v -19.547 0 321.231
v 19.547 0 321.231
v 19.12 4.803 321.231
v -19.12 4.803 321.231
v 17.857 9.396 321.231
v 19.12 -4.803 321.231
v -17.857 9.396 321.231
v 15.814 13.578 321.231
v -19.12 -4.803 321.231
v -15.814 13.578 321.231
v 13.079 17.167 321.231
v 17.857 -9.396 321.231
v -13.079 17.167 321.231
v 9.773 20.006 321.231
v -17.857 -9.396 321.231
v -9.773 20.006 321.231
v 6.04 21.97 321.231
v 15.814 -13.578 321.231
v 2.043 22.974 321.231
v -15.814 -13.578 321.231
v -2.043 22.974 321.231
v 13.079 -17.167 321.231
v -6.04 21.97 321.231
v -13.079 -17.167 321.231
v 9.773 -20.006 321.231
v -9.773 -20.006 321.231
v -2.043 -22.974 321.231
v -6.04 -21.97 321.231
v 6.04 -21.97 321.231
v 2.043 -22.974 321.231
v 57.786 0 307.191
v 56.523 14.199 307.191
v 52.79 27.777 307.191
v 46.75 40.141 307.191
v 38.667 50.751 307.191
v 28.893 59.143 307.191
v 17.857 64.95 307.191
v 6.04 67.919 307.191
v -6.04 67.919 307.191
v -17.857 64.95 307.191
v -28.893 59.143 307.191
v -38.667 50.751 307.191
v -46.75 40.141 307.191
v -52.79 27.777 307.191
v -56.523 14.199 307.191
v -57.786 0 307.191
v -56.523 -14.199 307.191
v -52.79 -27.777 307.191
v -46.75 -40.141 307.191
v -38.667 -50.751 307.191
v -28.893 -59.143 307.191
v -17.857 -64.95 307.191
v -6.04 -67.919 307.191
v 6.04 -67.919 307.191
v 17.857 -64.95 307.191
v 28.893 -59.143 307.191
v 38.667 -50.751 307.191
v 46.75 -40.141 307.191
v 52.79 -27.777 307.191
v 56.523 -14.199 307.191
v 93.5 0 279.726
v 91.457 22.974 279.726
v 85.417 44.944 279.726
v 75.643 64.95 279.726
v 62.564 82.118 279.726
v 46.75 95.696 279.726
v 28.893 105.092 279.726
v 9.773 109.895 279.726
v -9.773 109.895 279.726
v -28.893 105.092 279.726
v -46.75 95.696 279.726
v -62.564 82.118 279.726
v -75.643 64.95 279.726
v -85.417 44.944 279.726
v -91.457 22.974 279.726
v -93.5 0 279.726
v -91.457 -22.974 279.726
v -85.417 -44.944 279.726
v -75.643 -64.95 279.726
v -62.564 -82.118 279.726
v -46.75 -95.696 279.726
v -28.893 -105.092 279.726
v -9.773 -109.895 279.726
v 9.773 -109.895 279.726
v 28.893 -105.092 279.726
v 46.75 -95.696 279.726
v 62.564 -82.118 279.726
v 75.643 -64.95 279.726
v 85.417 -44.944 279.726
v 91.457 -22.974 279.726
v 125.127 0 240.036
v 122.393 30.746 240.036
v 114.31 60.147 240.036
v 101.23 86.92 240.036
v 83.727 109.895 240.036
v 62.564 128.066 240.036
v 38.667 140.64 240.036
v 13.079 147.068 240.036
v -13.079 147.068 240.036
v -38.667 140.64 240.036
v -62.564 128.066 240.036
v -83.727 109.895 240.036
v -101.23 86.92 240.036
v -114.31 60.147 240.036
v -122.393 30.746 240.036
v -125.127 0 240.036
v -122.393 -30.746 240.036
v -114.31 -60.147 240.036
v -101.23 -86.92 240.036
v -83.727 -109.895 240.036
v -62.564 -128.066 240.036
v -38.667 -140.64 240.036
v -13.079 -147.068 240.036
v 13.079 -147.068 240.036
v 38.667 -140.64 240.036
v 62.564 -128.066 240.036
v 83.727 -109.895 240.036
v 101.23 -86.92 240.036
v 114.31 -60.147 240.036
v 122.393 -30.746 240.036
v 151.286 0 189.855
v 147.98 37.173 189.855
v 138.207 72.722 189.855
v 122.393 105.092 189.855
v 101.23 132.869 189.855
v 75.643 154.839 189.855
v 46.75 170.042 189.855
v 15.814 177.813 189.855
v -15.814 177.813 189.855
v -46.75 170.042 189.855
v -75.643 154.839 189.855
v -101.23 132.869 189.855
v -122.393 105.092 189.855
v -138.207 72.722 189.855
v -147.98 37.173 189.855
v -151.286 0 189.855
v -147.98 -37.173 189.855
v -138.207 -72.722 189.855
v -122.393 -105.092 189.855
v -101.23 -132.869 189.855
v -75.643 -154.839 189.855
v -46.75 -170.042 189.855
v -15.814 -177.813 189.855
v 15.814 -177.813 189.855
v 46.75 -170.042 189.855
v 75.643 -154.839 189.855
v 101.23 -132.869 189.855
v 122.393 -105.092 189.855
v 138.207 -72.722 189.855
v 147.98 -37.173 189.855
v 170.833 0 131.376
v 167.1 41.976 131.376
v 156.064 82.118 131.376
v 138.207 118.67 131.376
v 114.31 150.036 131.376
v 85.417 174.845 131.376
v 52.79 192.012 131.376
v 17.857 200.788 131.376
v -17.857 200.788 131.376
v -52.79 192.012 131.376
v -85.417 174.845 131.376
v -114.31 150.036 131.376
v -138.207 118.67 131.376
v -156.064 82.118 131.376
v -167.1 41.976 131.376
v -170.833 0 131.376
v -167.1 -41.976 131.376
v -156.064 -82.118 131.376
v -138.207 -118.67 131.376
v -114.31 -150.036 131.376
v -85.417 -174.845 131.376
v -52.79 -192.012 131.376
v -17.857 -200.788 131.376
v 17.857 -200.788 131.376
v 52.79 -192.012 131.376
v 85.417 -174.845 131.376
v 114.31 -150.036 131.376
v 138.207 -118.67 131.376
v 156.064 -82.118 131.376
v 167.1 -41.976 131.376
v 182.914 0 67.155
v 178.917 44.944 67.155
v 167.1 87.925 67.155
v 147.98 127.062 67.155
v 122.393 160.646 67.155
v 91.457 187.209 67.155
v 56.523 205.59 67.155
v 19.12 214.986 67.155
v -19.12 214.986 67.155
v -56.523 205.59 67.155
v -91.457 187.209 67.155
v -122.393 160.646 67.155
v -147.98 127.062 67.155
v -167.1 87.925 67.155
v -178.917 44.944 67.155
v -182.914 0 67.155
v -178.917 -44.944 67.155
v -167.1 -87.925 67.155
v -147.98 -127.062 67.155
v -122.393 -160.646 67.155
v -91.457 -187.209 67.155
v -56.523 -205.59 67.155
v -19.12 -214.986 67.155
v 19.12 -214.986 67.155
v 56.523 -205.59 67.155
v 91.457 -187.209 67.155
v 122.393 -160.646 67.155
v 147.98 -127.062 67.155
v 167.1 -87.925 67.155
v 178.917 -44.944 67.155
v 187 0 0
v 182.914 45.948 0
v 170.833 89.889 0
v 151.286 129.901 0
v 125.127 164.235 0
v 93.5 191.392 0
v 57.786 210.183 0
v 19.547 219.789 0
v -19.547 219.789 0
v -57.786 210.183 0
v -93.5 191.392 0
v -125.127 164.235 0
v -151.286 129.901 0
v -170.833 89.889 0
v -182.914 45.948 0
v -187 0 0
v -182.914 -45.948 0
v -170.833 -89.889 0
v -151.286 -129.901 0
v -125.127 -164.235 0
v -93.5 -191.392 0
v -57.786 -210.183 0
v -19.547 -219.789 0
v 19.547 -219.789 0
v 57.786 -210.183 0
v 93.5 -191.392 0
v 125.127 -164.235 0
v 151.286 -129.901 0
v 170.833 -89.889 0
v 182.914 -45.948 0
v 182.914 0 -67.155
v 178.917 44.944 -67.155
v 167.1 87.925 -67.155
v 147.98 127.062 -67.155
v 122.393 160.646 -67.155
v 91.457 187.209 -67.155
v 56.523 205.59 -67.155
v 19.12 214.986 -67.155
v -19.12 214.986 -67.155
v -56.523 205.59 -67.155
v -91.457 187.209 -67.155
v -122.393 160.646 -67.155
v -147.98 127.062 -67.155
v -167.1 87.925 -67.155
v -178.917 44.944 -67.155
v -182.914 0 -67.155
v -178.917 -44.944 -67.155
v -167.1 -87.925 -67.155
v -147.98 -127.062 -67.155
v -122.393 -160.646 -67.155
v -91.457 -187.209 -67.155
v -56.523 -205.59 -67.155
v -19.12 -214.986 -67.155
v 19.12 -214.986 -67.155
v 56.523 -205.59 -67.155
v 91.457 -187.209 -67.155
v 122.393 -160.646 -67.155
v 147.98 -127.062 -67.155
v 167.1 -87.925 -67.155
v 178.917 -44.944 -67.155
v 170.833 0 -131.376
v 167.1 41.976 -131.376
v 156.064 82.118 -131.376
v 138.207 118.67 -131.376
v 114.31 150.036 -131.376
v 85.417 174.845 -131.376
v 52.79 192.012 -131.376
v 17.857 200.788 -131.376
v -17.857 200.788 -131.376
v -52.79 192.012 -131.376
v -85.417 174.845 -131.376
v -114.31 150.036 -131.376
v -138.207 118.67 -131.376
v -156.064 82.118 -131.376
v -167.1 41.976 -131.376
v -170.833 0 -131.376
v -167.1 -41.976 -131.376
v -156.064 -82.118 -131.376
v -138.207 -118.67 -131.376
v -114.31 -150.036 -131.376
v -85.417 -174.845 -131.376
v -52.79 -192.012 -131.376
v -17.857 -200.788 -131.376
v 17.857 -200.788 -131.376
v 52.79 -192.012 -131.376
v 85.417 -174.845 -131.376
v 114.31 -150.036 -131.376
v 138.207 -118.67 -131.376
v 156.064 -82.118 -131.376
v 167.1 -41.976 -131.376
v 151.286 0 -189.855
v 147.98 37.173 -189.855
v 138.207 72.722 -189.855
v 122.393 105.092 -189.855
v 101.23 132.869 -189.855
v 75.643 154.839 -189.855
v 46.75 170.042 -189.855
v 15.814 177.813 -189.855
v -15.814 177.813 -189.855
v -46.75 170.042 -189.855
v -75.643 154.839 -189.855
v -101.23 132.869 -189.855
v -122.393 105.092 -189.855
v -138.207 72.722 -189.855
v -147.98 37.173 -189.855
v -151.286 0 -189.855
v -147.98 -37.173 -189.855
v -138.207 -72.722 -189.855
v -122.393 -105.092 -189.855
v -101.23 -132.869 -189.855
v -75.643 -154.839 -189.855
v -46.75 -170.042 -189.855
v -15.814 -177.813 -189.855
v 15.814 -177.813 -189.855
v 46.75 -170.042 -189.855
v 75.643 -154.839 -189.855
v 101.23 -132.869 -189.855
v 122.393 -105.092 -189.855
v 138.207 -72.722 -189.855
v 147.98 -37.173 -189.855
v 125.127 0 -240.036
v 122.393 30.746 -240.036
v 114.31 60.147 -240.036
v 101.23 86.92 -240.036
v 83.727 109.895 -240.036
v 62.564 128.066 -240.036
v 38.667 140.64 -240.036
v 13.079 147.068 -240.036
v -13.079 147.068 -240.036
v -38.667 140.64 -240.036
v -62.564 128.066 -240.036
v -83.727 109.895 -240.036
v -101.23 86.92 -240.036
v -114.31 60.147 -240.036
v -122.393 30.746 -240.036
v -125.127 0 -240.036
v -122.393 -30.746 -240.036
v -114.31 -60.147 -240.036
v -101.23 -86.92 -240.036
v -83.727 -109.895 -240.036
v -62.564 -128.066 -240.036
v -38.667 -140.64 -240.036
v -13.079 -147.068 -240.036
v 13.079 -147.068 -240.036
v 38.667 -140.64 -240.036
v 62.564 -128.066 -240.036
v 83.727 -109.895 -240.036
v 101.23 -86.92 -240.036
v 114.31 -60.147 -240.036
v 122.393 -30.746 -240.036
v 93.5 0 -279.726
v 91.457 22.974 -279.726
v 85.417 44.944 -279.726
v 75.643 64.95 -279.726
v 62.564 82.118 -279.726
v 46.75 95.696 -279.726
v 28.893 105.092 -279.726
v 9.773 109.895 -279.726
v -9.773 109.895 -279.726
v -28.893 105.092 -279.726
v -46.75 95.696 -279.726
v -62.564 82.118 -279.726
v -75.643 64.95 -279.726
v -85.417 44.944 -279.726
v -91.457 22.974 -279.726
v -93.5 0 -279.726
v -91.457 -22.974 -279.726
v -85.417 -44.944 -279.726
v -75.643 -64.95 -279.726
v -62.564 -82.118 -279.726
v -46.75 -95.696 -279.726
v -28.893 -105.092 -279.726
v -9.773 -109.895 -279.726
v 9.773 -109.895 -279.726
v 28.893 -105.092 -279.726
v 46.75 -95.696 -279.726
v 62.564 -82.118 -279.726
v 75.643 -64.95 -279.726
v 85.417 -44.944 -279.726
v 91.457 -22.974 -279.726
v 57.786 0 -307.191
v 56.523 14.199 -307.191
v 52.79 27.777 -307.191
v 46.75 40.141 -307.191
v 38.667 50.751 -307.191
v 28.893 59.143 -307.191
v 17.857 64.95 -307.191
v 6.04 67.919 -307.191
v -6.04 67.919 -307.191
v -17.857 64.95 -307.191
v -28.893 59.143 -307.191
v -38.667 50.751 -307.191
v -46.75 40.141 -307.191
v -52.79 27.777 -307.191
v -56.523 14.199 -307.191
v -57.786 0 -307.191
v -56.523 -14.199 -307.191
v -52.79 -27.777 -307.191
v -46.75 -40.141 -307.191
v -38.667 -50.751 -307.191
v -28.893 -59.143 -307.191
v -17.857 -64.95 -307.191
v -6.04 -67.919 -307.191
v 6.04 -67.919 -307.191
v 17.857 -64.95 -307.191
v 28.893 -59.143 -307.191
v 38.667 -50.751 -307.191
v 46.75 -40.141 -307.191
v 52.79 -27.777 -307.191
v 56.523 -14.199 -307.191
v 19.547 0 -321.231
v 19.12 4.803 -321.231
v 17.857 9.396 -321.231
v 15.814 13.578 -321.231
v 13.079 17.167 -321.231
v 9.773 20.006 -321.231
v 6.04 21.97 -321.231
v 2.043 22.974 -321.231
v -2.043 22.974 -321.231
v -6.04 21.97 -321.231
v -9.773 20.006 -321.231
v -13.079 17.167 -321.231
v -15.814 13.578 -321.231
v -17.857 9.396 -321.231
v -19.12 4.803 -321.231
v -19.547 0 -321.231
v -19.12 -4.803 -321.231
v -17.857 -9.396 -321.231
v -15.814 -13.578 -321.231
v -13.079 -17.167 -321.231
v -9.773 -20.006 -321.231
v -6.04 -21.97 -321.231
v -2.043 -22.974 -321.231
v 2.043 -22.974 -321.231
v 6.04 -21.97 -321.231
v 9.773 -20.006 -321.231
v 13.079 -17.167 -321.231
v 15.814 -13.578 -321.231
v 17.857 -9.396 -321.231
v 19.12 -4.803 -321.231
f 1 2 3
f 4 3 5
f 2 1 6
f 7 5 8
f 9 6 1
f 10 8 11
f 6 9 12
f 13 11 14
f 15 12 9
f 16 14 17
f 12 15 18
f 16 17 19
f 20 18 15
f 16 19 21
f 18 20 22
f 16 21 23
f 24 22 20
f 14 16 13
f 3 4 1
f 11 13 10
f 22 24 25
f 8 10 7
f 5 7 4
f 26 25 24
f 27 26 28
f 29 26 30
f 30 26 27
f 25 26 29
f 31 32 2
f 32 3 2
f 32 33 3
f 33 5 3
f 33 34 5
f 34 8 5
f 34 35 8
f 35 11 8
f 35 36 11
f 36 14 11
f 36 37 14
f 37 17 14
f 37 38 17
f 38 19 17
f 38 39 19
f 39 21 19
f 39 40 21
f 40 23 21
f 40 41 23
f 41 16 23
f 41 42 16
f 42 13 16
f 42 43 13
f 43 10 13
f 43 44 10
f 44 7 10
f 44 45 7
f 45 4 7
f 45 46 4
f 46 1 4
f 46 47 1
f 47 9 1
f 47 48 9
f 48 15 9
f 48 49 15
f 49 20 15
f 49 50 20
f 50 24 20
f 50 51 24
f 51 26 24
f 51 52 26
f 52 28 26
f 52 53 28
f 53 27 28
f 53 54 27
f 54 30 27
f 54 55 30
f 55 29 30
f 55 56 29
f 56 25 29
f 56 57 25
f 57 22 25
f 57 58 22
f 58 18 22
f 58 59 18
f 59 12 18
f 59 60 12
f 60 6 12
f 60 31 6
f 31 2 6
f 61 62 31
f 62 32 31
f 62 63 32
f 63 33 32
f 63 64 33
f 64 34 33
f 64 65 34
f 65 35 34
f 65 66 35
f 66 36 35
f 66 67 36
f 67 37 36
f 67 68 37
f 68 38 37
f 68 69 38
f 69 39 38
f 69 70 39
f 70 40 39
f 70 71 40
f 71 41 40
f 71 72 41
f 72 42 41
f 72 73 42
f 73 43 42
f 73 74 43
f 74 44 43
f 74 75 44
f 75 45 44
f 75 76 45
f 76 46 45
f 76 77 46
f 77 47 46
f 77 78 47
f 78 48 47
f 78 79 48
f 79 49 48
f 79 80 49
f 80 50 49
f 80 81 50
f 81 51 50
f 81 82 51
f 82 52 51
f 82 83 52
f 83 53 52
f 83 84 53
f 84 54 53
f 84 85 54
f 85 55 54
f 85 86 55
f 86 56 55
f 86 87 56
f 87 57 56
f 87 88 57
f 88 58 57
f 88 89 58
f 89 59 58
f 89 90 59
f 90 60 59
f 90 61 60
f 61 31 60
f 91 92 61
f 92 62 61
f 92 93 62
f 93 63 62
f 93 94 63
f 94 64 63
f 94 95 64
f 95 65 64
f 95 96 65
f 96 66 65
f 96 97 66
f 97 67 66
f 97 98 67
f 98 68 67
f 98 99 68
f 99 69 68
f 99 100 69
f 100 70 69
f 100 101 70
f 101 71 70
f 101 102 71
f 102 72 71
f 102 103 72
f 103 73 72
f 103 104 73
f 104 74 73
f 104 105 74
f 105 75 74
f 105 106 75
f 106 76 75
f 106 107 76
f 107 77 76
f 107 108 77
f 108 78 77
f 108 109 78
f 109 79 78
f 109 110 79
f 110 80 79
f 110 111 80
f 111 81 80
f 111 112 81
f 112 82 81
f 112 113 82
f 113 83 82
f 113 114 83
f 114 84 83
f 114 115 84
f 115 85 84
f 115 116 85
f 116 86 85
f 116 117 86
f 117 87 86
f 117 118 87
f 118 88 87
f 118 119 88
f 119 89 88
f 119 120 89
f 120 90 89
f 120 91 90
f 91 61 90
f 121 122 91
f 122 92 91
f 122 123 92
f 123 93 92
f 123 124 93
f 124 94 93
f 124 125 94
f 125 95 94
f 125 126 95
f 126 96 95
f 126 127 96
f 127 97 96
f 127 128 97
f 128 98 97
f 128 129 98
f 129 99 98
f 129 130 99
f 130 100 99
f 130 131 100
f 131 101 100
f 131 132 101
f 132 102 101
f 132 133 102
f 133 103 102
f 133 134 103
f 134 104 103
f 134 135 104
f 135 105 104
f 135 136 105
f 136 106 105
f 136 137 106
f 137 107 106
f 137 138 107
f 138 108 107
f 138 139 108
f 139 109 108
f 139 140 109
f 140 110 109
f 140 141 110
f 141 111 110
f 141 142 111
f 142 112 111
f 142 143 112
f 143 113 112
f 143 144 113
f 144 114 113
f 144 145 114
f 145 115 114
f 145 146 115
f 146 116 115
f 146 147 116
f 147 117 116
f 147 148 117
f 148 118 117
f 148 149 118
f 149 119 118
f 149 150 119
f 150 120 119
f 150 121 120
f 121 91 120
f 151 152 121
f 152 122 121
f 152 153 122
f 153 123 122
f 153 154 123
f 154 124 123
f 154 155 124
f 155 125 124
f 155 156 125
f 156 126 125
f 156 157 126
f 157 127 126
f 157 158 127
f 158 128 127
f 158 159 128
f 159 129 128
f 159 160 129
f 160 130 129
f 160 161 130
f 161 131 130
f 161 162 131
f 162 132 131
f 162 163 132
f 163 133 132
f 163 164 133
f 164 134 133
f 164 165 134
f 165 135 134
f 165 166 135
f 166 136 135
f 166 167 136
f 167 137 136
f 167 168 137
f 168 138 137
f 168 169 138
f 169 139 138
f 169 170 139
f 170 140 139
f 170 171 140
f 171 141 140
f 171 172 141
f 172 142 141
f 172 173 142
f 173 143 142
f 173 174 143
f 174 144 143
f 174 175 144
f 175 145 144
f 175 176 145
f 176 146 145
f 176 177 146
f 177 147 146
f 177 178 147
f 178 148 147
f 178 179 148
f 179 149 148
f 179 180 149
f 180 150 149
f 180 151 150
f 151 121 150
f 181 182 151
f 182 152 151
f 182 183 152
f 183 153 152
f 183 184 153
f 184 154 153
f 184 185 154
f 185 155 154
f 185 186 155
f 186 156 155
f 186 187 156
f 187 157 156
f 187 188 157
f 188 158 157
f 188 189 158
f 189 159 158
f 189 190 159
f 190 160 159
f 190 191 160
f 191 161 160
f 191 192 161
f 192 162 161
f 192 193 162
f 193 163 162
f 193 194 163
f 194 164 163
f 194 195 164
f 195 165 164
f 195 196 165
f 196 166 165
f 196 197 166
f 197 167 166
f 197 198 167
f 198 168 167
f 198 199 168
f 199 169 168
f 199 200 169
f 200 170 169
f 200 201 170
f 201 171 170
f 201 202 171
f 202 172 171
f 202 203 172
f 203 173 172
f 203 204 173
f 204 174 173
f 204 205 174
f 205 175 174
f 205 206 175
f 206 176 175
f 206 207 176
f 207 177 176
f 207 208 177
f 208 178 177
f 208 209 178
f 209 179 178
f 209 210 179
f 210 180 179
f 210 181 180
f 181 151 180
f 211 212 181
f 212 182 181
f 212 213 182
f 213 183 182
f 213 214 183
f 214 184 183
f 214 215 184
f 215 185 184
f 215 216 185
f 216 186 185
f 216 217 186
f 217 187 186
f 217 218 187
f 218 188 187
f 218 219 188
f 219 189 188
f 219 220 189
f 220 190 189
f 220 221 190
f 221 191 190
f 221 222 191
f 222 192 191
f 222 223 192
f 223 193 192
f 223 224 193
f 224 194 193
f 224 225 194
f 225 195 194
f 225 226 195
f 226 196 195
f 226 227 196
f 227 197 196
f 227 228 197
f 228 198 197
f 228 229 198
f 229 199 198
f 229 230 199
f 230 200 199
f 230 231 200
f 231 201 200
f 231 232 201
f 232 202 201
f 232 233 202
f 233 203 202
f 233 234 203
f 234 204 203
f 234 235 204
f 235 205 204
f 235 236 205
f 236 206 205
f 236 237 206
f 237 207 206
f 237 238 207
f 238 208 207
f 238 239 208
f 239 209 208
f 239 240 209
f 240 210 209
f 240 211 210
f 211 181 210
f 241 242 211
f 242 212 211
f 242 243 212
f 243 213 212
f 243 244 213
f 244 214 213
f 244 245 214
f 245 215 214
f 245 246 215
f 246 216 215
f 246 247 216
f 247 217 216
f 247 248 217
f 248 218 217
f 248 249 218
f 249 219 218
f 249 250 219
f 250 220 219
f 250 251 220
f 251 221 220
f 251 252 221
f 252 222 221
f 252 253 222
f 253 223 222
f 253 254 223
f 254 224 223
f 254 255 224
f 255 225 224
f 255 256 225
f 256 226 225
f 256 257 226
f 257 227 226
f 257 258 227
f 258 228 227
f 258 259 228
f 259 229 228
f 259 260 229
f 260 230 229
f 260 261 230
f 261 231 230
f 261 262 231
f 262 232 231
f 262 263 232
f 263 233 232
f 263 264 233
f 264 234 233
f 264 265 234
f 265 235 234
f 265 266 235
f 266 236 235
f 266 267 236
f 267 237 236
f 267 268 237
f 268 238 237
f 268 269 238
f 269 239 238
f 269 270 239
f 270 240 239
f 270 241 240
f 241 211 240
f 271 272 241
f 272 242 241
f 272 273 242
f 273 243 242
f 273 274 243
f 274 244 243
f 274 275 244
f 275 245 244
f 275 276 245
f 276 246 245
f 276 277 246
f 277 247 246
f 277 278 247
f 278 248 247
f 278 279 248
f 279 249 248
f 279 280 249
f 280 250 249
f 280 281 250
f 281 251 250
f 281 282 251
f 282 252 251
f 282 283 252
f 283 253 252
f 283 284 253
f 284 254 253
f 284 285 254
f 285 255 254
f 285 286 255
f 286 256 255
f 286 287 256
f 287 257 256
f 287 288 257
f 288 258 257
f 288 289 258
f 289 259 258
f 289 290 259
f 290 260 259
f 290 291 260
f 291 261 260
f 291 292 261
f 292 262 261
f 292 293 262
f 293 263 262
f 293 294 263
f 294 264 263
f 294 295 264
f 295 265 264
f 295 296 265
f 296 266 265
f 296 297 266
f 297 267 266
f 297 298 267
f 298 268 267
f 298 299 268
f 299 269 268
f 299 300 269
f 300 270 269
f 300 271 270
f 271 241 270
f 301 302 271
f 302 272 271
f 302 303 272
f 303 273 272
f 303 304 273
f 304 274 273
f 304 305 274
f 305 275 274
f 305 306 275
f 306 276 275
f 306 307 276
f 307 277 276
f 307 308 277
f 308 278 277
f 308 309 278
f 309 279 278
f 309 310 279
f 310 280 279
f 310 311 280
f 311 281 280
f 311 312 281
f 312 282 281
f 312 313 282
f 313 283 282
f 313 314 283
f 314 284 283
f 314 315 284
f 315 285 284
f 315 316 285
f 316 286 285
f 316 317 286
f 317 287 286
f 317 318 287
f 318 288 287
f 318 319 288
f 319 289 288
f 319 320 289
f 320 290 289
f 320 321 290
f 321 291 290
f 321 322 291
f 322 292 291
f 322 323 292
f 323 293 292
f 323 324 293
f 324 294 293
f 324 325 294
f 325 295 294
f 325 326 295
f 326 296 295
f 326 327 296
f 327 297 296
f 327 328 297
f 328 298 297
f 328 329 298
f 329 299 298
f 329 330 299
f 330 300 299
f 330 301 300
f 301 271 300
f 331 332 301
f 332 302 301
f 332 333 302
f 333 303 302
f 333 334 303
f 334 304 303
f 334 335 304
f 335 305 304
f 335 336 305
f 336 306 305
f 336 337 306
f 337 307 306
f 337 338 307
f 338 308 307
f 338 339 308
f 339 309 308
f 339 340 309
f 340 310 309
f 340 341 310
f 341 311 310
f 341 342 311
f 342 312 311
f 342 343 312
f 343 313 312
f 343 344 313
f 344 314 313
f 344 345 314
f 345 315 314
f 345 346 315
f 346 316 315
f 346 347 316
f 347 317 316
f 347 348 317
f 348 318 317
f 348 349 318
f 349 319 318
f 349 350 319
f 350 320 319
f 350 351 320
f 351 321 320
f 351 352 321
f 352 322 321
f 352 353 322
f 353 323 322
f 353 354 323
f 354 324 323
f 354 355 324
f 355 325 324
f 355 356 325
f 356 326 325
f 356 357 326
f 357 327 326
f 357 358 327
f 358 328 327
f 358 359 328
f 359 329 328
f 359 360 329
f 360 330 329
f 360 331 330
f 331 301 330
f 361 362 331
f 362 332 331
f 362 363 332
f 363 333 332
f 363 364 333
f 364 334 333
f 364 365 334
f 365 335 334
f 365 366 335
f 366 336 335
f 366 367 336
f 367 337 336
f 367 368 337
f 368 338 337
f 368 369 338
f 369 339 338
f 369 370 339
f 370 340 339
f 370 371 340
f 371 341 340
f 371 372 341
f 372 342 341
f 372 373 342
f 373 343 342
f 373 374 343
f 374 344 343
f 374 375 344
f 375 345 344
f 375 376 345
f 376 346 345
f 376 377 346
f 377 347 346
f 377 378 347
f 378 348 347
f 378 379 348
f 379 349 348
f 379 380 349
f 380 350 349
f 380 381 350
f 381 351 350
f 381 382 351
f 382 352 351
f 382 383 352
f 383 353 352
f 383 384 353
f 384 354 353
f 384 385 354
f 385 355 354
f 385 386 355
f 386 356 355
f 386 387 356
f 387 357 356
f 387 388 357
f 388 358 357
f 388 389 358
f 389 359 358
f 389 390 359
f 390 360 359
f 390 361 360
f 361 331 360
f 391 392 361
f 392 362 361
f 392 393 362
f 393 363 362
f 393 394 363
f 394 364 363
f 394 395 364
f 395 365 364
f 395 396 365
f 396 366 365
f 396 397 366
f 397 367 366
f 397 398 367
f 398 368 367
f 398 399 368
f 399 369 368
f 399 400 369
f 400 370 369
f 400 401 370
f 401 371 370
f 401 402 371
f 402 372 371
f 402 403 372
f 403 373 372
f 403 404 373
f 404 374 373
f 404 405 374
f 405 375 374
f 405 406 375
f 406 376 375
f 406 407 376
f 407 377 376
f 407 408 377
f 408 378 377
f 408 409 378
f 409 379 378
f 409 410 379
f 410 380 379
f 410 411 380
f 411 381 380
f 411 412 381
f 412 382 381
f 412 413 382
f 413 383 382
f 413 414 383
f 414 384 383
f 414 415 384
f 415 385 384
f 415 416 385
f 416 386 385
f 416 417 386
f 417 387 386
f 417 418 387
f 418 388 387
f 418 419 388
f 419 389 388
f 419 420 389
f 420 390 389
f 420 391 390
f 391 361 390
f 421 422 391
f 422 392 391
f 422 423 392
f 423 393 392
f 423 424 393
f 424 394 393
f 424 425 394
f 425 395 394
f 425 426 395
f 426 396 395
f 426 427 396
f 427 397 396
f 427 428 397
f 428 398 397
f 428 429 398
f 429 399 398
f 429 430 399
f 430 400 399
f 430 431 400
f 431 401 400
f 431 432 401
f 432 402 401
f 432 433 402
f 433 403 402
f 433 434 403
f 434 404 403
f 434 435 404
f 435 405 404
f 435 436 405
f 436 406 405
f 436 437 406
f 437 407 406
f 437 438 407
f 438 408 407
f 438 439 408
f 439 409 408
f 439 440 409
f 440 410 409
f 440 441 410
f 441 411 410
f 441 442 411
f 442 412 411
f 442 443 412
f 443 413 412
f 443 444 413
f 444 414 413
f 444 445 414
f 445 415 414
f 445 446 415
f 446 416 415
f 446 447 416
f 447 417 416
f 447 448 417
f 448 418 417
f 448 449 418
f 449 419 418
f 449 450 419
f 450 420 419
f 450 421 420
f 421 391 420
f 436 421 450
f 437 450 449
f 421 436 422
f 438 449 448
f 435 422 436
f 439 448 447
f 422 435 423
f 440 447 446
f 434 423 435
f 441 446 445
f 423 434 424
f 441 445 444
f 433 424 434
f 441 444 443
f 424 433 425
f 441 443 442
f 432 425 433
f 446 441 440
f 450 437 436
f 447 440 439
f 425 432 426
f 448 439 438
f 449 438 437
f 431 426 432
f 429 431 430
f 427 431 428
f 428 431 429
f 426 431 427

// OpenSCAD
// Generated by SolidPython 1.0.1 on 2020-07-29 00:46:50


scale(v = [11, 13, 19]) {
	sphere(r = 17);
}
/***********************************************
*********      SolidPython code:      **********
************************************************
 
# import packages: SolidPython
from solid import *
from solid.utils import *
from itertools import chain, combinations, permutations


class Resize:

    def __init__(self, scad_file):
        self.scad_file = scad_file
        #self.scad_file = import_scad(scad_file)
        # cone/cylinder param:
        self.r1 = 0
        self.r2 = 0
        self.h = 0
        # rectangular prism param:
        self.w = 0
        self.l = 0
        # ellipse param:
        self.r = 0

    # import OpenScad code (file name corresponds to shape)


    # classify shape + parameters
    def assign(self, param1, param2, param3):
        if self.scad_file == 'cone.scad':
            self.r1 = param1
            self.r2 = param2
            self.h = param3
        elif self.scad_file == 'cylinder.scad':
            self.r1 = param1
            self.r2 = param2
            self.h = param3
        elif self.scad_file == 'rectangularPrism.scad':
            self.h = param1
            self.l = param2
            self.w = param3
        else:
            self.r = param1
            self.h = param2

    # resize parameters
    def iterate(self):
        x = range(3, 20, 2)
        i = 1
        if self.scad_file == 'cone.scad':
            tempList = list(permutations(x, 2))
            for temp in tempList:
                param1 = temp[0]
                param2 = temp[1]
                filepath = 'produced_scad_files/' + 'cone' + str(param1) + '_' + str(param2) + '_' + '.scad'
                scad_render_to_file(cylinder(h=param1, r1=param2, r2=0), filepath)

        elif self.scad_file == 'cylinder.scad':
            tempList = list(permutations(x, 3))
            for temp in tempList:
                param1 = temp[0]
                param2 = temp[1]
                filepath = 'produced_scad_files/' + 'cylinder' + str(param1) + '_' + str(param2) + '_' + '.scad'
                scad_render_to_file(cylinder(h=param1, r1=param2, r2=param2), filepath)

        elif self.scad_file == 'rectangularPrism.scad':
            tempList = list(permutations(x, 3))
            for temp in tempList:
                param1 = temp[0]
                param2 = temp[1]
                param3 = temp[2]
                filepath = 'produced_scad_files/' + 'rectangularPrism' + str(param1) + '_' + str(param2) + '_' + str(
                    param3) + '.scad'
                scad_render_to_file(cube(size=(param1, param2, param3)), filepath)

        elif self.scad_file == 'ellipse.scad':
            tempList = list(permutations(x, 4))
            for temp in tempList:
                param1 = temp[0]
                param2 = temp[1]
                param3 = temp[2]
                param4 = temp[3]
                filepath = 'produced_scad_files/' + 'ellipse' + str(param1) + '_' + str(param2) + '_' + str(param3) + '_' + str(param4) + '.scad'
                scad_render_to_file(scale([param1, param2, param3])(sphere(r=param4)), filepath)

    def render_to_scadfile(self):
        scad_render_to_file(scad, 'example.scad') 
 
************************************************/
